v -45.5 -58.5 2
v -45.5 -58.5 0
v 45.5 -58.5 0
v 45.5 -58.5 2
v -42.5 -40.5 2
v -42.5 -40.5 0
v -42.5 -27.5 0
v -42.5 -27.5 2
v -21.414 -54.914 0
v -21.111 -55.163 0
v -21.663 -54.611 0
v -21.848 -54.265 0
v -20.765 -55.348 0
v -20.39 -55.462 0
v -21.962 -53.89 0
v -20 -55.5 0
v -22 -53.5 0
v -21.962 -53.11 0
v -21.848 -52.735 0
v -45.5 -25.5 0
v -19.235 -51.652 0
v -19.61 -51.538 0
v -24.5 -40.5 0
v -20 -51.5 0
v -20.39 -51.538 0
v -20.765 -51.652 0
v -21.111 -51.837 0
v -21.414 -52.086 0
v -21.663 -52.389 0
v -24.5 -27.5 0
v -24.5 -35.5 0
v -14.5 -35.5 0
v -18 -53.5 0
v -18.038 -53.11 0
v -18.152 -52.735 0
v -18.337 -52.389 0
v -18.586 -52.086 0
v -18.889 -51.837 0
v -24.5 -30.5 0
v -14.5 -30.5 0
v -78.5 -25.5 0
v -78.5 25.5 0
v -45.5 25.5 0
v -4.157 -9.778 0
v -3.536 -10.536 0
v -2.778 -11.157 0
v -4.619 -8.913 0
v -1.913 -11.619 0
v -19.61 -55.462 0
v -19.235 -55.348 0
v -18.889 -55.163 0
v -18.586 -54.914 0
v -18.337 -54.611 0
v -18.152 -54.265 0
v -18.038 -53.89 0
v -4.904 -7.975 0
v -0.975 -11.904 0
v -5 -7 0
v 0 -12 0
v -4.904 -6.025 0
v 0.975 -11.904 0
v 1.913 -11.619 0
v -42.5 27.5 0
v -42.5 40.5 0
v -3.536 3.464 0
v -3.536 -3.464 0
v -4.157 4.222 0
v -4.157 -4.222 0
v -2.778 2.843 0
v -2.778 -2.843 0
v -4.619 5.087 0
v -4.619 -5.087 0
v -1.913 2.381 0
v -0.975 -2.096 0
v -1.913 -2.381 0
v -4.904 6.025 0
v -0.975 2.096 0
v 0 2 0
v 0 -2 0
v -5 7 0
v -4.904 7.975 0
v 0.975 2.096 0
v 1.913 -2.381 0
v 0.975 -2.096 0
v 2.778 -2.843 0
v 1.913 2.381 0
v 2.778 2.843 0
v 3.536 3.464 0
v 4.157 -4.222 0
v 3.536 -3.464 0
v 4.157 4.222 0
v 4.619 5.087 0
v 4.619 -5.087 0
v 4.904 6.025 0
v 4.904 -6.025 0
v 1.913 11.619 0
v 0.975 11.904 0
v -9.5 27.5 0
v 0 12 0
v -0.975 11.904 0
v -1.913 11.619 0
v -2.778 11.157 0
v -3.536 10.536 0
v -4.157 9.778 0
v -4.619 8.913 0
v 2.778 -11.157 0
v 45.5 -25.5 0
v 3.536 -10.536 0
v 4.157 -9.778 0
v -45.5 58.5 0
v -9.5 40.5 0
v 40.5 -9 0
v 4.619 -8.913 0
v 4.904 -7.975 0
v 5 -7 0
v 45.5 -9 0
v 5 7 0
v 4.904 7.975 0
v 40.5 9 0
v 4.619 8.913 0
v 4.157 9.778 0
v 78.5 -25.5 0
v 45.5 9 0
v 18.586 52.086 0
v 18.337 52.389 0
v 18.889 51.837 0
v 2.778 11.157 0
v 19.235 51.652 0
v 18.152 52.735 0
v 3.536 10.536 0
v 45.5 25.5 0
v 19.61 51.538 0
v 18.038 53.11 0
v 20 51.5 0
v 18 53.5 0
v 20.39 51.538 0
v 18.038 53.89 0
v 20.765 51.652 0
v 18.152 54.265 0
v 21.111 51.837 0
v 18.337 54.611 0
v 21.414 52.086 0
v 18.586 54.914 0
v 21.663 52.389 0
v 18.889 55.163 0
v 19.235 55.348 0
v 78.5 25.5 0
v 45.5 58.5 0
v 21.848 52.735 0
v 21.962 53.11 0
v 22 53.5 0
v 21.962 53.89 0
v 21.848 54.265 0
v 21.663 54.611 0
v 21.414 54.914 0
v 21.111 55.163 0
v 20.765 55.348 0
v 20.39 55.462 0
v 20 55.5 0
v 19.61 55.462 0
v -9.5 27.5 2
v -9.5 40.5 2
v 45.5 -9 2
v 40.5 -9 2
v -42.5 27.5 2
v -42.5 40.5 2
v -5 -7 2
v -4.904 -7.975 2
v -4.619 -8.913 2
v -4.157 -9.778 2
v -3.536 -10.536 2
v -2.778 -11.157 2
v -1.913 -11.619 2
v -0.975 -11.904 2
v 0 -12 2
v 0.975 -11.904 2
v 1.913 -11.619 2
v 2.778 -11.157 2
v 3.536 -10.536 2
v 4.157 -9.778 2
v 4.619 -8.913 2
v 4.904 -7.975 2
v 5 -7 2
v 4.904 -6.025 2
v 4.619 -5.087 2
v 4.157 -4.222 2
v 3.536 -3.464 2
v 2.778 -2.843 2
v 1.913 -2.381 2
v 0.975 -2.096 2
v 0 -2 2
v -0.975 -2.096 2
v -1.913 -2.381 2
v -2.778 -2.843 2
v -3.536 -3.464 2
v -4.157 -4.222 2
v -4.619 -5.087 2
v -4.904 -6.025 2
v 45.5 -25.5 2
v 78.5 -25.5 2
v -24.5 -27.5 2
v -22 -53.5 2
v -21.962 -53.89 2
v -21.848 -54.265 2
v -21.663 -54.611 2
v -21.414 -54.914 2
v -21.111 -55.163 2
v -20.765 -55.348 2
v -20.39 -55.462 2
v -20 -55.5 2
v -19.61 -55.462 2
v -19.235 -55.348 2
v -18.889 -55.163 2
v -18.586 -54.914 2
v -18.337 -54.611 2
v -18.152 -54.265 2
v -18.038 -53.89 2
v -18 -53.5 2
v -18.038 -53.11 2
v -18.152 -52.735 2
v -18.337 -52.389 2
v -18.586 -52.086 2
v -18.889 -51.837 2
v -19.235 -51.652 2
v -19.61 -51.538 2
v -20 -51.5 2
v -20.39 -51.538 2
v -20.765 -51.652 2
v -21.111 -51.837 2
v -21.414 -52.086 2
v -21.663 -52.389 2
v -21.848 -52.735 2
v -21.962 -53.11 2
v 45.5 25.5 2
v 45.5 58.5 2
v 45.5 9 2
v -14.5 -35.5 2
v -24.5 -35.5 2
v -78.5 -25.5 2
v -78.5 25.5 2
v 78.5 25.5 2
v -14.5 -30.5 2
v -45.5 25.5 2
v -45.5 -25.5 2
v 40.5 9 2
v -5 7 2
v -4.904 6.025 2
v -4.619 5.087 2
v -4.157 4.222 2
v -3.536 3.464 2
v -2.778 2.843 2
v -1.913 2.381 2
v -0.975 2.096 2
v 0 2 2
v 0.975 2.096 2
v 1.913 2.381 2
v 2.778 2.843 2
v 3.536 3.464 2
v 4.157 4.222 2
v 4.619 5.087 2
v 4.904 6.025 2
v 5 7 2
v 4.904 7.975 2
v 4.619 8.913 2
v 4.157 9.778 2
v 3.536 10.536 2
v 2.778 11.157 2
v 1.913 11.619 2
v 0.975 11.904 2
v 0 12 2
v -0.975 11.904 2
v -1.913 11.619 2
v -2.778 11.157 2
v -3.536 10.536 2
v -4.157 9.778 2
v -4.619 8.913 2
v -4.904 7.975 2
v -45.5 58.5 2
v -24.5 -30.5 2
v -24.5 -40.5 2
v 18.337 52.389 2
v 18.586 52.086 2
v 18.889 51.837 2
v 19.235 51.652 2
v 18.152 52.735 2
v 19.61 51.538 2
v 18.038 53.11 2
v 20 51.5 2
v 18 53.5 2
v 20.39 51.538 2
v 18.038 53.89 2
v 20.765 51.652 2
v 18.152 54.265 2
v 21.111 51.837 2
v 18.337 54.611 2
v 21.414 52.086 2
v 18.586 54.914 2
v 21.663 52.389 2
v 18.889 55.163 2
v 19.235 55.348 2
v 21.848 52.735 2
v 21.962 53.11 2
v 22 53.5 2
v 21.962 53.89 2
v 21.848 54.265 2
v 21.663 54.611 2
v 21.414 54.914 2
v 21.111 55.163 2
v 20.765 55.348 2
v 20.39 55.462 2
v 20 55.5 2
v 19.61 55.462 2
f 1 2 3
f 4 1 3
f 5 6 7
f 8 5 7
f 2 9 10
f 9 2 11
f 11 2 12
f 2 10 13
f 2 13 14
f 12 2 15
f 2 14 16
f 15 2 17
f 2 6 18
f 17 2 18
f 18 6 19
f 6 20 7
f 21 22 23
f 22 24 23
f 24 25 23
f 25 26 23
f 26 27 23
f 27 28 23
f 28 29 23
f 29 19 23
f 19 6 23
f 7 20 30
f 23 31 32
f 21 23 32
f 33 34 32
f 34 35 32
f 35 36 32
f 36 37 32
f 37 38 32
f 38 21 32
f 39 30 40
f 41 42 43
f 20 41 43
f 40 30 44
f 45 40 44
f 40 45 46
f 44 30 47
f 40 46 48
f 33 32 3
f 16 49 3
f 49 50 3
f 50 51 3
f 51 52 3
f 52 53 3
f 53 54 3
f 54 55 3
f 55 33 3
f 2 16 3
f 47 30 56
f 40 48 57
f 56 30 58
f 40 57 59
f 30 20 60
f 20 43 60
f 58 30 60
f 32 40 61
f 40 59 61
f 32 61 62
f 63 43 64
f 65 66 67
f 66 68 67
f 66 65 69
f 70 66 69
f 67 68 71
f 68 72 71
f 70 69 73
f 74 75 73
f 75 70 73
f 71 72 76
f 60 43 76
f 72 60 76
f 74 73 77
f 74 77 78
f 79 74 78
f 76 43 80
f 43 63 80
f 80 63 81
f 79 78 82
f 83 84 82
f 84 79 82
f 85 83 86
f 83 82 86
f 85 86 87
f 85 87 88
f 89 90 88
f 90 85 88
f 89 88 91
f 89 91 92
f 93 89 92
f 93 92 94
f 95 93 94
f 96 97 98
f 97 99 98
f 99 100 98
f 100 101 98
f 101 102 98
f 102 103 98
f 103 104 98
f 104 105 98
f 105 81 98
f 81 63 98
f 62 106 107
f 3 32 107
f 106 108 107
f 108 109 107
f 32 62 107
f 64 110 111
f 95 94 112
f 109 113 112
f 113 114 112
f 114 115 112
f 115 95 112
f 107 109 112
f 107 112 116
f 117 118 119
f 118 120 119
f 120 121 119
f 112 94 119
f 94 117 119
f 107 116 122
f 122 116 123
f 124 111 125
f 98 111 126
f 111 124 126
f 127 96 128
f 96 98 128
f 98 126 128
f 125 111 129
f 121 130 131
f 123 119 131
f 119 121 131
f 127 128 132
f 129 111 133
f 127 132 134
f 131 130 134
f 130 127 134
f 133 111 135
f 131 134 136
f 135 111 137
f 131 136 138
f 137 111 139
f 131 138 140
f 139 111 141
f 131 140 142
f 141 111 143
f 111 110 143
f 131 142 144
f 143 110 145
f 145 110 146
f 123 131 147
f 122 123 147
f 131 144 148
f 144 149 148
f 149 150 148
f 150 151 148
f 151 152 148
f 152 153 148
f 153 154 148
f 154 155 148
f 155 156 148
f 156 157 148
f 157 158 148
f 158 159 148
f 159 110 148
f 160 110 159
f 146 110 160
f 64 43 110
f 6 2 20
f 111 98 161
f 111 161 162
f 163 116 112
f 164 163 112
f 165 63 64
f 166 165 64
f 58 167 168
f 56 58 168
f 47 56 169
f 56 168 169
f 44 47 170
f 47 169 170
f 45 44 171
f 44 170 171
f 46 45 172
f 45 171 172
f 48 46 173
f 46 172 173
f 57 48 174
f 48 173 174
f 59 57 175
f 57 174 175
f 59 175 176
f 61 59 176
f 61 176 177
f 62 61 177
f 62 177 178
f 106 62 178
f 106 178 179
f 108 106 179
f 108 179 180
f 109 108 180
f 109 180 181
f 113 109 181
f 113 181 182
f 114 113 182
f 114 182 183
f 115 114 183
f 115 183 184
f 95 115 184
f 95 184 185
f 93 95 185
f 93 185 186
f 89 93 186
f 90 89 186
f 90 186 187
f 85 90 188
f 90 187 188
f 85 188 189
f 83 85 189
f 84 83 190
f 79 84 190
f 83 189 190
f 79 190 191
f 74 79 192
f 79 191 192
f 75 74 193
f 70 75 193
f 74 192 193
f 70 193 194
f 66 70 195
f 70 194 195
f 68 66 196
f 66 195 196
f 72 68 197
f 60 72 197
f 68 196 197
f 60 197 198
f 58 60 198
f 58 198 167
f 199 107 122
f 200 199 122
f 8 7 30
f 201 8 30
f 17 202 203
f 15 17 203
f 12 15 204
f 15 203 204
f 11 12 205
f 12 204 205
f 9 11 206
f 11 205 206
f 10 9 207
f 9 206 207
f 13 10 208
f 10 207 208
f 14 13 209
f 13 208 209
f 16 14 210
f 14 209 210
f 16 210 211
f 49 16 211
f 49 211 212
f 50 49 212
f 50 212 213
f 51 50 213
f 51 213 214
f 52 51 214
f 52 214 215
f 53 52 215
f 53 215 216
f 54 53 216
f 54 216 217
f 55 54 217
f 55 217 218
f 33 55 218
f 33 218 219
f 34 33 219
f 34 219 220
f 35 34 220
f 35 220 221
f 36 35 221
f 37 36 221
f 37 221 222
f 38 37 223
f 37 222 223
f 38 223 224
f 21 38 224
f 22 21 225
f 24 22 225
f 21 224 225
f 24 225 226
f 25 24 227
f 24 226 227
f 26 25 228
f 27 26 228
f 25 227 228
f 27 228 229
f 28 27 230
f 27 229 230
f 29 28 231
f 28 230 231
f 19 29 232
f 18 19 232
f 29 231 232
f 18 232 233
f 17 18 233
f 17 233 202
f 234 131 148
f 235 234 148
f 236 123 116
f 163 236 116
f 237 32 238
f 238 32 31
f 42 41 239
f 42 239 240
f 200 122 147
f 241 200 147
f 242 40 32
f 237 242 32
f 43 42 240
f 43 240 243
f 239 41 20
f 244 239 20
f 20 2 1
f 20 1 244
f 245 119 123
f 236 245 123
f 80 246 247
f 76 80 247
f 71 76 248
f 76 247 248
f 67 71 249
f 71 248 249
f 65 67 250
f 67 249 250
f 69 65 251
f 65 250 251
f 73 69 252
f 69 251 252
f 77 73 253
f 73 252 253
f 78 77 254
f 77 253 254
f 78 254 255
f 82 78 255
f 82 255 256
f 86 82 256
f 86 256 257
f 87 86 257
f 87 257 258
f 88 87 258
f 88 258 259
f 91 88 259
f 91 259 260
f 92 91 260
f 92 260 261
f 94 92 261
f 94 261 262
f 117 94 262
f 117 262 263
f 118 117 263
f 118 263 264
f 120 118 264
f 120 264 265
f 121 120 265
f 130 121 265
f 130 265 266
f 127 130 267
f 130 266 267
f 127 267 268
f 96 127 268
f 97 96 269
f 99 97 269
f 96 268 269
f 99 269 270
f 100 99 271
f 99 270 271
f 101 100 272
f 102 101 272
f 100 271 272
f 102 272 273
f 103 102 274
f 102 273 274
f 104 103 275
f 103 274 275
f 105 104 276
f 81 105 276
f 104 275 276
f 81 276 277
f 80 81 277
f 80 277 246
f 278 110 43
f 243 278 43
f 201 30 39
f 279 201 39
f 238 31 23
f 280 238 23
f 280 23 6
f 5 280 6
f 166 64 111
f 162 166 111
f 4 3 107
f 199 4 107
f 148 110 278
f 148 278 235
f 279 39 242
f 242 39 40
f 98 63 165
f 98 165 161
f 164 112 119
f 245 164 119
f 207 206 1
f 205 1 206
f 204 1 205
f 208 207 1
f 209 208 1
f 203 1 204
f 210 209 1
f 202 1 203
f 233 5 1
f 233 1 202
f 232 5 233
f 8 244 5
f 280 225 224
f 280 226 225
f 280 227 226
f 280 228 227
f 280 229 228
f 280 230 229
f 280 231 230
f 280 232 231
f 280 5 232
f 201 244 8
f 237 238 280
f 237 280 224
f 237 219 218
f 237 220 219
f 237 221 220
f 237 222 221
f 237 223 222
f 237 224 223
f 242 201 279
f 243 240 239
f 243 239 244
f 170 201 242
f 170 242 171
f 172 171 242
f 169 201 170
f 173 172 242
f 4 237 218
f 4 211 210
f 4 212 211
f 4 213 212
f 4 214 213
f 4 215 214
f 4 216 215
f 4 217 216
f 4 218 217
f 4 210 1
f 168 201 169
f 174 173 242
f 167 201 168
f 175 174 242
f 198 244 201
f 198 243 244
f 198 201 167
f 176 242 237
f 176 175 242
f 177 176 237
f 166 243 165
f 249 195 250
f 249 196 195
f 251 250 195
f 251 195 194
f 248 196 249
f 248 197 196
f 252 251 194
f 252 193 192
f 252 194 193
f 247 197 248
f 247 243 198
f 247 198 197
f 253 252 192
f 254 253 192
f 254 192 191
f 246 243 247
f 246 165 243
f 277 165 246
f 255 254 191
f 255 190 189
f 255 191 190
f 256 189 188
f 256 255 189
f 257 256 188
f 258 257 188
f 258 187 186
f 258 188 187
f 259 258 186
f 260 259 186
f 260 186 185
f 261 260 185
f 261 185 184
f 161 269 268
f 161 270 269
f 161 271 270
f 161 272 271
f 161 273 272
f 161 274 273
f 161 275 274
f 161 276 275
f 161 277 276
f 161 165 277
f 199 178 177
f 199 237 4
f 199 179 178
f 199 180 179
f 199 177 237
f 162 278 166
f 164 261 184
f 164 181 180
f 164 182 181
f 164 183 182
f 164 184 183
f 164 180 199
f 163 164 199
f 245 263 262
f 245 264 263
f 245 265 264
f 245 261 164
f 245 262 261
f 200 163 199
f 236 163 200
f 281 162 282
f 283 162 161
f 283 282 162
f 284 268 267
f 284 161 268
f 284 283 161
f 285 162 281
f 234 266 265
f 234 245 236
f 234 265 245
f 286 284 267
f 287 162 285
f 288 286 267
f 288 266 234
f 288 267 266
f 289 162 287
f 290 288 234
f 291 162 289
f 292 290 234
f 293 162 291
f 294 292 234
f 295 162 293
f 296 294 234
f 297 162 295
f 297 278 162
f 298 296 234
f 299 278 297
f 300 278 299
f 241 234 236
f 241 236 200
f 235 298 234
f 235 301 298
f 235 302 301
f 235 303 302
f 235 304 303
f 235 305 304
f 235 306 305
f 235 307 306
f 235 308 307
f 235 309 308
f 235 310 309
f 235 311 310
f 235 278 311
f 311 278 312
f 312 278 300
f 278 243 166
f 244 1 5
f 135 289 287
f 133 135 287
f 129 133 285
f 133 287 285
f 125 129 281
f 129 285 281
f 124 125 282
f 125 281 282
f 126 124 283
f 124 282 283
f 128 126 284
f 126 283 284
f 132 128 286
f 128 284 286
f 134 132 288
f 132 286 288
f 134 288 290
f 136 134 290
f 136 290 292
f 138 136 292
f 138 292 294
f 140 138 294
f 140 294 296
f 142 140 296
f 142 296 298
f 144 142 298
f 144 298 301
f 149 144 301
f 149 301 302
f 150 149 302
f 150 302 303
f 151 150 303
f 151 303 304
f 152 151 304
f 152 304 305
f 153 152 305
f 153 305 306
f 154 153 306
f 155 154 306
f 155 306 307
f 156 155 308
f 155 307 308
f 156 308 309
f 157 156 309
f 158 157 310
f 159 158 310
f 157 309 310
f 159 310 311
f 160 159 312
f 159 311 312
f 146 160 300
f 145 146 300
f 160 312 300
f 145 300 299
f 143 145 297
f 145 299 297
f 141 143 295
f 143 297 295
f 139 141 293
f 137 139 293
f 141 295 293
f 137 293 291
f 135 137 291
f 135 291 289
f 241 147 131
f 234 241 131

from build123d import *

# Parameters (mm, degrees)
F0_W     = 91
F0_H     = 33
F0_W_2   = 33
F0_H_2   = 13
F0_H_3   = 51
F1_DEPTH = 2
F2_D     = 4
F3_D     = 10


with BuildPart() as f1:
    # F0 (on Top) → F1 (new body)
    with BuildSketch(Plane.XY):
        Polygon((45.5, 9), (45.5, 25.5), (-45.5, 25.5), (-45.5, -25.5), (45.5, -25.5), (45.5, -9), (40.5, -9), (40.5, 9), align=None)
        Polygon((78.5, 25.5), (45.5, 25.5), (45.5, 9), (45.5, -9), (45.5, -25.5), (78.5, -25.5), align=None)
        with Locations((0, 42)):
            Rectangle(F0_W, F0_H)
        with Locations((-26, 34)):
            Rectangle(F0_W_2, F0_H_2, mode=Mode.SUBTRACT)
        with Locations((-62, 0)):
            Rectangle(F0_W_2, F0_H_3)
        with Locations((0, -42)):
            Rectangle(F0_W, F0_H)
        Polygon((-24.5, -40.5), (-42.5, -40.5), (-42.5, -27.5), (-24.5, -27.5), (-24.5, -30.5), (-14.5, -30.5), (-14.5, -35.5), (-24.5, -35.5), align=None, mode=Mode.SUBTRACT)
    extrude(amount=F1_DEPTH)

    # F2 (through all)
    with Locations(Plane(origin=(0, 0, 0), x_dir=(1, 0, 0), z_dir=(0, 0, -1))):
        with Locations((-20, 53.5), (20, -53.5)):
            Hole(F2_D / 2)

    # F3 (through all)
    with Locations(Plane(origin=(0, 0, 0), x_dir=(1, 0, 0), z_dir=(0, 0, -1))):
        with Locations((0, -7), (0, 7)):
            Hole(F3_D / 2)


solid = f1.part
